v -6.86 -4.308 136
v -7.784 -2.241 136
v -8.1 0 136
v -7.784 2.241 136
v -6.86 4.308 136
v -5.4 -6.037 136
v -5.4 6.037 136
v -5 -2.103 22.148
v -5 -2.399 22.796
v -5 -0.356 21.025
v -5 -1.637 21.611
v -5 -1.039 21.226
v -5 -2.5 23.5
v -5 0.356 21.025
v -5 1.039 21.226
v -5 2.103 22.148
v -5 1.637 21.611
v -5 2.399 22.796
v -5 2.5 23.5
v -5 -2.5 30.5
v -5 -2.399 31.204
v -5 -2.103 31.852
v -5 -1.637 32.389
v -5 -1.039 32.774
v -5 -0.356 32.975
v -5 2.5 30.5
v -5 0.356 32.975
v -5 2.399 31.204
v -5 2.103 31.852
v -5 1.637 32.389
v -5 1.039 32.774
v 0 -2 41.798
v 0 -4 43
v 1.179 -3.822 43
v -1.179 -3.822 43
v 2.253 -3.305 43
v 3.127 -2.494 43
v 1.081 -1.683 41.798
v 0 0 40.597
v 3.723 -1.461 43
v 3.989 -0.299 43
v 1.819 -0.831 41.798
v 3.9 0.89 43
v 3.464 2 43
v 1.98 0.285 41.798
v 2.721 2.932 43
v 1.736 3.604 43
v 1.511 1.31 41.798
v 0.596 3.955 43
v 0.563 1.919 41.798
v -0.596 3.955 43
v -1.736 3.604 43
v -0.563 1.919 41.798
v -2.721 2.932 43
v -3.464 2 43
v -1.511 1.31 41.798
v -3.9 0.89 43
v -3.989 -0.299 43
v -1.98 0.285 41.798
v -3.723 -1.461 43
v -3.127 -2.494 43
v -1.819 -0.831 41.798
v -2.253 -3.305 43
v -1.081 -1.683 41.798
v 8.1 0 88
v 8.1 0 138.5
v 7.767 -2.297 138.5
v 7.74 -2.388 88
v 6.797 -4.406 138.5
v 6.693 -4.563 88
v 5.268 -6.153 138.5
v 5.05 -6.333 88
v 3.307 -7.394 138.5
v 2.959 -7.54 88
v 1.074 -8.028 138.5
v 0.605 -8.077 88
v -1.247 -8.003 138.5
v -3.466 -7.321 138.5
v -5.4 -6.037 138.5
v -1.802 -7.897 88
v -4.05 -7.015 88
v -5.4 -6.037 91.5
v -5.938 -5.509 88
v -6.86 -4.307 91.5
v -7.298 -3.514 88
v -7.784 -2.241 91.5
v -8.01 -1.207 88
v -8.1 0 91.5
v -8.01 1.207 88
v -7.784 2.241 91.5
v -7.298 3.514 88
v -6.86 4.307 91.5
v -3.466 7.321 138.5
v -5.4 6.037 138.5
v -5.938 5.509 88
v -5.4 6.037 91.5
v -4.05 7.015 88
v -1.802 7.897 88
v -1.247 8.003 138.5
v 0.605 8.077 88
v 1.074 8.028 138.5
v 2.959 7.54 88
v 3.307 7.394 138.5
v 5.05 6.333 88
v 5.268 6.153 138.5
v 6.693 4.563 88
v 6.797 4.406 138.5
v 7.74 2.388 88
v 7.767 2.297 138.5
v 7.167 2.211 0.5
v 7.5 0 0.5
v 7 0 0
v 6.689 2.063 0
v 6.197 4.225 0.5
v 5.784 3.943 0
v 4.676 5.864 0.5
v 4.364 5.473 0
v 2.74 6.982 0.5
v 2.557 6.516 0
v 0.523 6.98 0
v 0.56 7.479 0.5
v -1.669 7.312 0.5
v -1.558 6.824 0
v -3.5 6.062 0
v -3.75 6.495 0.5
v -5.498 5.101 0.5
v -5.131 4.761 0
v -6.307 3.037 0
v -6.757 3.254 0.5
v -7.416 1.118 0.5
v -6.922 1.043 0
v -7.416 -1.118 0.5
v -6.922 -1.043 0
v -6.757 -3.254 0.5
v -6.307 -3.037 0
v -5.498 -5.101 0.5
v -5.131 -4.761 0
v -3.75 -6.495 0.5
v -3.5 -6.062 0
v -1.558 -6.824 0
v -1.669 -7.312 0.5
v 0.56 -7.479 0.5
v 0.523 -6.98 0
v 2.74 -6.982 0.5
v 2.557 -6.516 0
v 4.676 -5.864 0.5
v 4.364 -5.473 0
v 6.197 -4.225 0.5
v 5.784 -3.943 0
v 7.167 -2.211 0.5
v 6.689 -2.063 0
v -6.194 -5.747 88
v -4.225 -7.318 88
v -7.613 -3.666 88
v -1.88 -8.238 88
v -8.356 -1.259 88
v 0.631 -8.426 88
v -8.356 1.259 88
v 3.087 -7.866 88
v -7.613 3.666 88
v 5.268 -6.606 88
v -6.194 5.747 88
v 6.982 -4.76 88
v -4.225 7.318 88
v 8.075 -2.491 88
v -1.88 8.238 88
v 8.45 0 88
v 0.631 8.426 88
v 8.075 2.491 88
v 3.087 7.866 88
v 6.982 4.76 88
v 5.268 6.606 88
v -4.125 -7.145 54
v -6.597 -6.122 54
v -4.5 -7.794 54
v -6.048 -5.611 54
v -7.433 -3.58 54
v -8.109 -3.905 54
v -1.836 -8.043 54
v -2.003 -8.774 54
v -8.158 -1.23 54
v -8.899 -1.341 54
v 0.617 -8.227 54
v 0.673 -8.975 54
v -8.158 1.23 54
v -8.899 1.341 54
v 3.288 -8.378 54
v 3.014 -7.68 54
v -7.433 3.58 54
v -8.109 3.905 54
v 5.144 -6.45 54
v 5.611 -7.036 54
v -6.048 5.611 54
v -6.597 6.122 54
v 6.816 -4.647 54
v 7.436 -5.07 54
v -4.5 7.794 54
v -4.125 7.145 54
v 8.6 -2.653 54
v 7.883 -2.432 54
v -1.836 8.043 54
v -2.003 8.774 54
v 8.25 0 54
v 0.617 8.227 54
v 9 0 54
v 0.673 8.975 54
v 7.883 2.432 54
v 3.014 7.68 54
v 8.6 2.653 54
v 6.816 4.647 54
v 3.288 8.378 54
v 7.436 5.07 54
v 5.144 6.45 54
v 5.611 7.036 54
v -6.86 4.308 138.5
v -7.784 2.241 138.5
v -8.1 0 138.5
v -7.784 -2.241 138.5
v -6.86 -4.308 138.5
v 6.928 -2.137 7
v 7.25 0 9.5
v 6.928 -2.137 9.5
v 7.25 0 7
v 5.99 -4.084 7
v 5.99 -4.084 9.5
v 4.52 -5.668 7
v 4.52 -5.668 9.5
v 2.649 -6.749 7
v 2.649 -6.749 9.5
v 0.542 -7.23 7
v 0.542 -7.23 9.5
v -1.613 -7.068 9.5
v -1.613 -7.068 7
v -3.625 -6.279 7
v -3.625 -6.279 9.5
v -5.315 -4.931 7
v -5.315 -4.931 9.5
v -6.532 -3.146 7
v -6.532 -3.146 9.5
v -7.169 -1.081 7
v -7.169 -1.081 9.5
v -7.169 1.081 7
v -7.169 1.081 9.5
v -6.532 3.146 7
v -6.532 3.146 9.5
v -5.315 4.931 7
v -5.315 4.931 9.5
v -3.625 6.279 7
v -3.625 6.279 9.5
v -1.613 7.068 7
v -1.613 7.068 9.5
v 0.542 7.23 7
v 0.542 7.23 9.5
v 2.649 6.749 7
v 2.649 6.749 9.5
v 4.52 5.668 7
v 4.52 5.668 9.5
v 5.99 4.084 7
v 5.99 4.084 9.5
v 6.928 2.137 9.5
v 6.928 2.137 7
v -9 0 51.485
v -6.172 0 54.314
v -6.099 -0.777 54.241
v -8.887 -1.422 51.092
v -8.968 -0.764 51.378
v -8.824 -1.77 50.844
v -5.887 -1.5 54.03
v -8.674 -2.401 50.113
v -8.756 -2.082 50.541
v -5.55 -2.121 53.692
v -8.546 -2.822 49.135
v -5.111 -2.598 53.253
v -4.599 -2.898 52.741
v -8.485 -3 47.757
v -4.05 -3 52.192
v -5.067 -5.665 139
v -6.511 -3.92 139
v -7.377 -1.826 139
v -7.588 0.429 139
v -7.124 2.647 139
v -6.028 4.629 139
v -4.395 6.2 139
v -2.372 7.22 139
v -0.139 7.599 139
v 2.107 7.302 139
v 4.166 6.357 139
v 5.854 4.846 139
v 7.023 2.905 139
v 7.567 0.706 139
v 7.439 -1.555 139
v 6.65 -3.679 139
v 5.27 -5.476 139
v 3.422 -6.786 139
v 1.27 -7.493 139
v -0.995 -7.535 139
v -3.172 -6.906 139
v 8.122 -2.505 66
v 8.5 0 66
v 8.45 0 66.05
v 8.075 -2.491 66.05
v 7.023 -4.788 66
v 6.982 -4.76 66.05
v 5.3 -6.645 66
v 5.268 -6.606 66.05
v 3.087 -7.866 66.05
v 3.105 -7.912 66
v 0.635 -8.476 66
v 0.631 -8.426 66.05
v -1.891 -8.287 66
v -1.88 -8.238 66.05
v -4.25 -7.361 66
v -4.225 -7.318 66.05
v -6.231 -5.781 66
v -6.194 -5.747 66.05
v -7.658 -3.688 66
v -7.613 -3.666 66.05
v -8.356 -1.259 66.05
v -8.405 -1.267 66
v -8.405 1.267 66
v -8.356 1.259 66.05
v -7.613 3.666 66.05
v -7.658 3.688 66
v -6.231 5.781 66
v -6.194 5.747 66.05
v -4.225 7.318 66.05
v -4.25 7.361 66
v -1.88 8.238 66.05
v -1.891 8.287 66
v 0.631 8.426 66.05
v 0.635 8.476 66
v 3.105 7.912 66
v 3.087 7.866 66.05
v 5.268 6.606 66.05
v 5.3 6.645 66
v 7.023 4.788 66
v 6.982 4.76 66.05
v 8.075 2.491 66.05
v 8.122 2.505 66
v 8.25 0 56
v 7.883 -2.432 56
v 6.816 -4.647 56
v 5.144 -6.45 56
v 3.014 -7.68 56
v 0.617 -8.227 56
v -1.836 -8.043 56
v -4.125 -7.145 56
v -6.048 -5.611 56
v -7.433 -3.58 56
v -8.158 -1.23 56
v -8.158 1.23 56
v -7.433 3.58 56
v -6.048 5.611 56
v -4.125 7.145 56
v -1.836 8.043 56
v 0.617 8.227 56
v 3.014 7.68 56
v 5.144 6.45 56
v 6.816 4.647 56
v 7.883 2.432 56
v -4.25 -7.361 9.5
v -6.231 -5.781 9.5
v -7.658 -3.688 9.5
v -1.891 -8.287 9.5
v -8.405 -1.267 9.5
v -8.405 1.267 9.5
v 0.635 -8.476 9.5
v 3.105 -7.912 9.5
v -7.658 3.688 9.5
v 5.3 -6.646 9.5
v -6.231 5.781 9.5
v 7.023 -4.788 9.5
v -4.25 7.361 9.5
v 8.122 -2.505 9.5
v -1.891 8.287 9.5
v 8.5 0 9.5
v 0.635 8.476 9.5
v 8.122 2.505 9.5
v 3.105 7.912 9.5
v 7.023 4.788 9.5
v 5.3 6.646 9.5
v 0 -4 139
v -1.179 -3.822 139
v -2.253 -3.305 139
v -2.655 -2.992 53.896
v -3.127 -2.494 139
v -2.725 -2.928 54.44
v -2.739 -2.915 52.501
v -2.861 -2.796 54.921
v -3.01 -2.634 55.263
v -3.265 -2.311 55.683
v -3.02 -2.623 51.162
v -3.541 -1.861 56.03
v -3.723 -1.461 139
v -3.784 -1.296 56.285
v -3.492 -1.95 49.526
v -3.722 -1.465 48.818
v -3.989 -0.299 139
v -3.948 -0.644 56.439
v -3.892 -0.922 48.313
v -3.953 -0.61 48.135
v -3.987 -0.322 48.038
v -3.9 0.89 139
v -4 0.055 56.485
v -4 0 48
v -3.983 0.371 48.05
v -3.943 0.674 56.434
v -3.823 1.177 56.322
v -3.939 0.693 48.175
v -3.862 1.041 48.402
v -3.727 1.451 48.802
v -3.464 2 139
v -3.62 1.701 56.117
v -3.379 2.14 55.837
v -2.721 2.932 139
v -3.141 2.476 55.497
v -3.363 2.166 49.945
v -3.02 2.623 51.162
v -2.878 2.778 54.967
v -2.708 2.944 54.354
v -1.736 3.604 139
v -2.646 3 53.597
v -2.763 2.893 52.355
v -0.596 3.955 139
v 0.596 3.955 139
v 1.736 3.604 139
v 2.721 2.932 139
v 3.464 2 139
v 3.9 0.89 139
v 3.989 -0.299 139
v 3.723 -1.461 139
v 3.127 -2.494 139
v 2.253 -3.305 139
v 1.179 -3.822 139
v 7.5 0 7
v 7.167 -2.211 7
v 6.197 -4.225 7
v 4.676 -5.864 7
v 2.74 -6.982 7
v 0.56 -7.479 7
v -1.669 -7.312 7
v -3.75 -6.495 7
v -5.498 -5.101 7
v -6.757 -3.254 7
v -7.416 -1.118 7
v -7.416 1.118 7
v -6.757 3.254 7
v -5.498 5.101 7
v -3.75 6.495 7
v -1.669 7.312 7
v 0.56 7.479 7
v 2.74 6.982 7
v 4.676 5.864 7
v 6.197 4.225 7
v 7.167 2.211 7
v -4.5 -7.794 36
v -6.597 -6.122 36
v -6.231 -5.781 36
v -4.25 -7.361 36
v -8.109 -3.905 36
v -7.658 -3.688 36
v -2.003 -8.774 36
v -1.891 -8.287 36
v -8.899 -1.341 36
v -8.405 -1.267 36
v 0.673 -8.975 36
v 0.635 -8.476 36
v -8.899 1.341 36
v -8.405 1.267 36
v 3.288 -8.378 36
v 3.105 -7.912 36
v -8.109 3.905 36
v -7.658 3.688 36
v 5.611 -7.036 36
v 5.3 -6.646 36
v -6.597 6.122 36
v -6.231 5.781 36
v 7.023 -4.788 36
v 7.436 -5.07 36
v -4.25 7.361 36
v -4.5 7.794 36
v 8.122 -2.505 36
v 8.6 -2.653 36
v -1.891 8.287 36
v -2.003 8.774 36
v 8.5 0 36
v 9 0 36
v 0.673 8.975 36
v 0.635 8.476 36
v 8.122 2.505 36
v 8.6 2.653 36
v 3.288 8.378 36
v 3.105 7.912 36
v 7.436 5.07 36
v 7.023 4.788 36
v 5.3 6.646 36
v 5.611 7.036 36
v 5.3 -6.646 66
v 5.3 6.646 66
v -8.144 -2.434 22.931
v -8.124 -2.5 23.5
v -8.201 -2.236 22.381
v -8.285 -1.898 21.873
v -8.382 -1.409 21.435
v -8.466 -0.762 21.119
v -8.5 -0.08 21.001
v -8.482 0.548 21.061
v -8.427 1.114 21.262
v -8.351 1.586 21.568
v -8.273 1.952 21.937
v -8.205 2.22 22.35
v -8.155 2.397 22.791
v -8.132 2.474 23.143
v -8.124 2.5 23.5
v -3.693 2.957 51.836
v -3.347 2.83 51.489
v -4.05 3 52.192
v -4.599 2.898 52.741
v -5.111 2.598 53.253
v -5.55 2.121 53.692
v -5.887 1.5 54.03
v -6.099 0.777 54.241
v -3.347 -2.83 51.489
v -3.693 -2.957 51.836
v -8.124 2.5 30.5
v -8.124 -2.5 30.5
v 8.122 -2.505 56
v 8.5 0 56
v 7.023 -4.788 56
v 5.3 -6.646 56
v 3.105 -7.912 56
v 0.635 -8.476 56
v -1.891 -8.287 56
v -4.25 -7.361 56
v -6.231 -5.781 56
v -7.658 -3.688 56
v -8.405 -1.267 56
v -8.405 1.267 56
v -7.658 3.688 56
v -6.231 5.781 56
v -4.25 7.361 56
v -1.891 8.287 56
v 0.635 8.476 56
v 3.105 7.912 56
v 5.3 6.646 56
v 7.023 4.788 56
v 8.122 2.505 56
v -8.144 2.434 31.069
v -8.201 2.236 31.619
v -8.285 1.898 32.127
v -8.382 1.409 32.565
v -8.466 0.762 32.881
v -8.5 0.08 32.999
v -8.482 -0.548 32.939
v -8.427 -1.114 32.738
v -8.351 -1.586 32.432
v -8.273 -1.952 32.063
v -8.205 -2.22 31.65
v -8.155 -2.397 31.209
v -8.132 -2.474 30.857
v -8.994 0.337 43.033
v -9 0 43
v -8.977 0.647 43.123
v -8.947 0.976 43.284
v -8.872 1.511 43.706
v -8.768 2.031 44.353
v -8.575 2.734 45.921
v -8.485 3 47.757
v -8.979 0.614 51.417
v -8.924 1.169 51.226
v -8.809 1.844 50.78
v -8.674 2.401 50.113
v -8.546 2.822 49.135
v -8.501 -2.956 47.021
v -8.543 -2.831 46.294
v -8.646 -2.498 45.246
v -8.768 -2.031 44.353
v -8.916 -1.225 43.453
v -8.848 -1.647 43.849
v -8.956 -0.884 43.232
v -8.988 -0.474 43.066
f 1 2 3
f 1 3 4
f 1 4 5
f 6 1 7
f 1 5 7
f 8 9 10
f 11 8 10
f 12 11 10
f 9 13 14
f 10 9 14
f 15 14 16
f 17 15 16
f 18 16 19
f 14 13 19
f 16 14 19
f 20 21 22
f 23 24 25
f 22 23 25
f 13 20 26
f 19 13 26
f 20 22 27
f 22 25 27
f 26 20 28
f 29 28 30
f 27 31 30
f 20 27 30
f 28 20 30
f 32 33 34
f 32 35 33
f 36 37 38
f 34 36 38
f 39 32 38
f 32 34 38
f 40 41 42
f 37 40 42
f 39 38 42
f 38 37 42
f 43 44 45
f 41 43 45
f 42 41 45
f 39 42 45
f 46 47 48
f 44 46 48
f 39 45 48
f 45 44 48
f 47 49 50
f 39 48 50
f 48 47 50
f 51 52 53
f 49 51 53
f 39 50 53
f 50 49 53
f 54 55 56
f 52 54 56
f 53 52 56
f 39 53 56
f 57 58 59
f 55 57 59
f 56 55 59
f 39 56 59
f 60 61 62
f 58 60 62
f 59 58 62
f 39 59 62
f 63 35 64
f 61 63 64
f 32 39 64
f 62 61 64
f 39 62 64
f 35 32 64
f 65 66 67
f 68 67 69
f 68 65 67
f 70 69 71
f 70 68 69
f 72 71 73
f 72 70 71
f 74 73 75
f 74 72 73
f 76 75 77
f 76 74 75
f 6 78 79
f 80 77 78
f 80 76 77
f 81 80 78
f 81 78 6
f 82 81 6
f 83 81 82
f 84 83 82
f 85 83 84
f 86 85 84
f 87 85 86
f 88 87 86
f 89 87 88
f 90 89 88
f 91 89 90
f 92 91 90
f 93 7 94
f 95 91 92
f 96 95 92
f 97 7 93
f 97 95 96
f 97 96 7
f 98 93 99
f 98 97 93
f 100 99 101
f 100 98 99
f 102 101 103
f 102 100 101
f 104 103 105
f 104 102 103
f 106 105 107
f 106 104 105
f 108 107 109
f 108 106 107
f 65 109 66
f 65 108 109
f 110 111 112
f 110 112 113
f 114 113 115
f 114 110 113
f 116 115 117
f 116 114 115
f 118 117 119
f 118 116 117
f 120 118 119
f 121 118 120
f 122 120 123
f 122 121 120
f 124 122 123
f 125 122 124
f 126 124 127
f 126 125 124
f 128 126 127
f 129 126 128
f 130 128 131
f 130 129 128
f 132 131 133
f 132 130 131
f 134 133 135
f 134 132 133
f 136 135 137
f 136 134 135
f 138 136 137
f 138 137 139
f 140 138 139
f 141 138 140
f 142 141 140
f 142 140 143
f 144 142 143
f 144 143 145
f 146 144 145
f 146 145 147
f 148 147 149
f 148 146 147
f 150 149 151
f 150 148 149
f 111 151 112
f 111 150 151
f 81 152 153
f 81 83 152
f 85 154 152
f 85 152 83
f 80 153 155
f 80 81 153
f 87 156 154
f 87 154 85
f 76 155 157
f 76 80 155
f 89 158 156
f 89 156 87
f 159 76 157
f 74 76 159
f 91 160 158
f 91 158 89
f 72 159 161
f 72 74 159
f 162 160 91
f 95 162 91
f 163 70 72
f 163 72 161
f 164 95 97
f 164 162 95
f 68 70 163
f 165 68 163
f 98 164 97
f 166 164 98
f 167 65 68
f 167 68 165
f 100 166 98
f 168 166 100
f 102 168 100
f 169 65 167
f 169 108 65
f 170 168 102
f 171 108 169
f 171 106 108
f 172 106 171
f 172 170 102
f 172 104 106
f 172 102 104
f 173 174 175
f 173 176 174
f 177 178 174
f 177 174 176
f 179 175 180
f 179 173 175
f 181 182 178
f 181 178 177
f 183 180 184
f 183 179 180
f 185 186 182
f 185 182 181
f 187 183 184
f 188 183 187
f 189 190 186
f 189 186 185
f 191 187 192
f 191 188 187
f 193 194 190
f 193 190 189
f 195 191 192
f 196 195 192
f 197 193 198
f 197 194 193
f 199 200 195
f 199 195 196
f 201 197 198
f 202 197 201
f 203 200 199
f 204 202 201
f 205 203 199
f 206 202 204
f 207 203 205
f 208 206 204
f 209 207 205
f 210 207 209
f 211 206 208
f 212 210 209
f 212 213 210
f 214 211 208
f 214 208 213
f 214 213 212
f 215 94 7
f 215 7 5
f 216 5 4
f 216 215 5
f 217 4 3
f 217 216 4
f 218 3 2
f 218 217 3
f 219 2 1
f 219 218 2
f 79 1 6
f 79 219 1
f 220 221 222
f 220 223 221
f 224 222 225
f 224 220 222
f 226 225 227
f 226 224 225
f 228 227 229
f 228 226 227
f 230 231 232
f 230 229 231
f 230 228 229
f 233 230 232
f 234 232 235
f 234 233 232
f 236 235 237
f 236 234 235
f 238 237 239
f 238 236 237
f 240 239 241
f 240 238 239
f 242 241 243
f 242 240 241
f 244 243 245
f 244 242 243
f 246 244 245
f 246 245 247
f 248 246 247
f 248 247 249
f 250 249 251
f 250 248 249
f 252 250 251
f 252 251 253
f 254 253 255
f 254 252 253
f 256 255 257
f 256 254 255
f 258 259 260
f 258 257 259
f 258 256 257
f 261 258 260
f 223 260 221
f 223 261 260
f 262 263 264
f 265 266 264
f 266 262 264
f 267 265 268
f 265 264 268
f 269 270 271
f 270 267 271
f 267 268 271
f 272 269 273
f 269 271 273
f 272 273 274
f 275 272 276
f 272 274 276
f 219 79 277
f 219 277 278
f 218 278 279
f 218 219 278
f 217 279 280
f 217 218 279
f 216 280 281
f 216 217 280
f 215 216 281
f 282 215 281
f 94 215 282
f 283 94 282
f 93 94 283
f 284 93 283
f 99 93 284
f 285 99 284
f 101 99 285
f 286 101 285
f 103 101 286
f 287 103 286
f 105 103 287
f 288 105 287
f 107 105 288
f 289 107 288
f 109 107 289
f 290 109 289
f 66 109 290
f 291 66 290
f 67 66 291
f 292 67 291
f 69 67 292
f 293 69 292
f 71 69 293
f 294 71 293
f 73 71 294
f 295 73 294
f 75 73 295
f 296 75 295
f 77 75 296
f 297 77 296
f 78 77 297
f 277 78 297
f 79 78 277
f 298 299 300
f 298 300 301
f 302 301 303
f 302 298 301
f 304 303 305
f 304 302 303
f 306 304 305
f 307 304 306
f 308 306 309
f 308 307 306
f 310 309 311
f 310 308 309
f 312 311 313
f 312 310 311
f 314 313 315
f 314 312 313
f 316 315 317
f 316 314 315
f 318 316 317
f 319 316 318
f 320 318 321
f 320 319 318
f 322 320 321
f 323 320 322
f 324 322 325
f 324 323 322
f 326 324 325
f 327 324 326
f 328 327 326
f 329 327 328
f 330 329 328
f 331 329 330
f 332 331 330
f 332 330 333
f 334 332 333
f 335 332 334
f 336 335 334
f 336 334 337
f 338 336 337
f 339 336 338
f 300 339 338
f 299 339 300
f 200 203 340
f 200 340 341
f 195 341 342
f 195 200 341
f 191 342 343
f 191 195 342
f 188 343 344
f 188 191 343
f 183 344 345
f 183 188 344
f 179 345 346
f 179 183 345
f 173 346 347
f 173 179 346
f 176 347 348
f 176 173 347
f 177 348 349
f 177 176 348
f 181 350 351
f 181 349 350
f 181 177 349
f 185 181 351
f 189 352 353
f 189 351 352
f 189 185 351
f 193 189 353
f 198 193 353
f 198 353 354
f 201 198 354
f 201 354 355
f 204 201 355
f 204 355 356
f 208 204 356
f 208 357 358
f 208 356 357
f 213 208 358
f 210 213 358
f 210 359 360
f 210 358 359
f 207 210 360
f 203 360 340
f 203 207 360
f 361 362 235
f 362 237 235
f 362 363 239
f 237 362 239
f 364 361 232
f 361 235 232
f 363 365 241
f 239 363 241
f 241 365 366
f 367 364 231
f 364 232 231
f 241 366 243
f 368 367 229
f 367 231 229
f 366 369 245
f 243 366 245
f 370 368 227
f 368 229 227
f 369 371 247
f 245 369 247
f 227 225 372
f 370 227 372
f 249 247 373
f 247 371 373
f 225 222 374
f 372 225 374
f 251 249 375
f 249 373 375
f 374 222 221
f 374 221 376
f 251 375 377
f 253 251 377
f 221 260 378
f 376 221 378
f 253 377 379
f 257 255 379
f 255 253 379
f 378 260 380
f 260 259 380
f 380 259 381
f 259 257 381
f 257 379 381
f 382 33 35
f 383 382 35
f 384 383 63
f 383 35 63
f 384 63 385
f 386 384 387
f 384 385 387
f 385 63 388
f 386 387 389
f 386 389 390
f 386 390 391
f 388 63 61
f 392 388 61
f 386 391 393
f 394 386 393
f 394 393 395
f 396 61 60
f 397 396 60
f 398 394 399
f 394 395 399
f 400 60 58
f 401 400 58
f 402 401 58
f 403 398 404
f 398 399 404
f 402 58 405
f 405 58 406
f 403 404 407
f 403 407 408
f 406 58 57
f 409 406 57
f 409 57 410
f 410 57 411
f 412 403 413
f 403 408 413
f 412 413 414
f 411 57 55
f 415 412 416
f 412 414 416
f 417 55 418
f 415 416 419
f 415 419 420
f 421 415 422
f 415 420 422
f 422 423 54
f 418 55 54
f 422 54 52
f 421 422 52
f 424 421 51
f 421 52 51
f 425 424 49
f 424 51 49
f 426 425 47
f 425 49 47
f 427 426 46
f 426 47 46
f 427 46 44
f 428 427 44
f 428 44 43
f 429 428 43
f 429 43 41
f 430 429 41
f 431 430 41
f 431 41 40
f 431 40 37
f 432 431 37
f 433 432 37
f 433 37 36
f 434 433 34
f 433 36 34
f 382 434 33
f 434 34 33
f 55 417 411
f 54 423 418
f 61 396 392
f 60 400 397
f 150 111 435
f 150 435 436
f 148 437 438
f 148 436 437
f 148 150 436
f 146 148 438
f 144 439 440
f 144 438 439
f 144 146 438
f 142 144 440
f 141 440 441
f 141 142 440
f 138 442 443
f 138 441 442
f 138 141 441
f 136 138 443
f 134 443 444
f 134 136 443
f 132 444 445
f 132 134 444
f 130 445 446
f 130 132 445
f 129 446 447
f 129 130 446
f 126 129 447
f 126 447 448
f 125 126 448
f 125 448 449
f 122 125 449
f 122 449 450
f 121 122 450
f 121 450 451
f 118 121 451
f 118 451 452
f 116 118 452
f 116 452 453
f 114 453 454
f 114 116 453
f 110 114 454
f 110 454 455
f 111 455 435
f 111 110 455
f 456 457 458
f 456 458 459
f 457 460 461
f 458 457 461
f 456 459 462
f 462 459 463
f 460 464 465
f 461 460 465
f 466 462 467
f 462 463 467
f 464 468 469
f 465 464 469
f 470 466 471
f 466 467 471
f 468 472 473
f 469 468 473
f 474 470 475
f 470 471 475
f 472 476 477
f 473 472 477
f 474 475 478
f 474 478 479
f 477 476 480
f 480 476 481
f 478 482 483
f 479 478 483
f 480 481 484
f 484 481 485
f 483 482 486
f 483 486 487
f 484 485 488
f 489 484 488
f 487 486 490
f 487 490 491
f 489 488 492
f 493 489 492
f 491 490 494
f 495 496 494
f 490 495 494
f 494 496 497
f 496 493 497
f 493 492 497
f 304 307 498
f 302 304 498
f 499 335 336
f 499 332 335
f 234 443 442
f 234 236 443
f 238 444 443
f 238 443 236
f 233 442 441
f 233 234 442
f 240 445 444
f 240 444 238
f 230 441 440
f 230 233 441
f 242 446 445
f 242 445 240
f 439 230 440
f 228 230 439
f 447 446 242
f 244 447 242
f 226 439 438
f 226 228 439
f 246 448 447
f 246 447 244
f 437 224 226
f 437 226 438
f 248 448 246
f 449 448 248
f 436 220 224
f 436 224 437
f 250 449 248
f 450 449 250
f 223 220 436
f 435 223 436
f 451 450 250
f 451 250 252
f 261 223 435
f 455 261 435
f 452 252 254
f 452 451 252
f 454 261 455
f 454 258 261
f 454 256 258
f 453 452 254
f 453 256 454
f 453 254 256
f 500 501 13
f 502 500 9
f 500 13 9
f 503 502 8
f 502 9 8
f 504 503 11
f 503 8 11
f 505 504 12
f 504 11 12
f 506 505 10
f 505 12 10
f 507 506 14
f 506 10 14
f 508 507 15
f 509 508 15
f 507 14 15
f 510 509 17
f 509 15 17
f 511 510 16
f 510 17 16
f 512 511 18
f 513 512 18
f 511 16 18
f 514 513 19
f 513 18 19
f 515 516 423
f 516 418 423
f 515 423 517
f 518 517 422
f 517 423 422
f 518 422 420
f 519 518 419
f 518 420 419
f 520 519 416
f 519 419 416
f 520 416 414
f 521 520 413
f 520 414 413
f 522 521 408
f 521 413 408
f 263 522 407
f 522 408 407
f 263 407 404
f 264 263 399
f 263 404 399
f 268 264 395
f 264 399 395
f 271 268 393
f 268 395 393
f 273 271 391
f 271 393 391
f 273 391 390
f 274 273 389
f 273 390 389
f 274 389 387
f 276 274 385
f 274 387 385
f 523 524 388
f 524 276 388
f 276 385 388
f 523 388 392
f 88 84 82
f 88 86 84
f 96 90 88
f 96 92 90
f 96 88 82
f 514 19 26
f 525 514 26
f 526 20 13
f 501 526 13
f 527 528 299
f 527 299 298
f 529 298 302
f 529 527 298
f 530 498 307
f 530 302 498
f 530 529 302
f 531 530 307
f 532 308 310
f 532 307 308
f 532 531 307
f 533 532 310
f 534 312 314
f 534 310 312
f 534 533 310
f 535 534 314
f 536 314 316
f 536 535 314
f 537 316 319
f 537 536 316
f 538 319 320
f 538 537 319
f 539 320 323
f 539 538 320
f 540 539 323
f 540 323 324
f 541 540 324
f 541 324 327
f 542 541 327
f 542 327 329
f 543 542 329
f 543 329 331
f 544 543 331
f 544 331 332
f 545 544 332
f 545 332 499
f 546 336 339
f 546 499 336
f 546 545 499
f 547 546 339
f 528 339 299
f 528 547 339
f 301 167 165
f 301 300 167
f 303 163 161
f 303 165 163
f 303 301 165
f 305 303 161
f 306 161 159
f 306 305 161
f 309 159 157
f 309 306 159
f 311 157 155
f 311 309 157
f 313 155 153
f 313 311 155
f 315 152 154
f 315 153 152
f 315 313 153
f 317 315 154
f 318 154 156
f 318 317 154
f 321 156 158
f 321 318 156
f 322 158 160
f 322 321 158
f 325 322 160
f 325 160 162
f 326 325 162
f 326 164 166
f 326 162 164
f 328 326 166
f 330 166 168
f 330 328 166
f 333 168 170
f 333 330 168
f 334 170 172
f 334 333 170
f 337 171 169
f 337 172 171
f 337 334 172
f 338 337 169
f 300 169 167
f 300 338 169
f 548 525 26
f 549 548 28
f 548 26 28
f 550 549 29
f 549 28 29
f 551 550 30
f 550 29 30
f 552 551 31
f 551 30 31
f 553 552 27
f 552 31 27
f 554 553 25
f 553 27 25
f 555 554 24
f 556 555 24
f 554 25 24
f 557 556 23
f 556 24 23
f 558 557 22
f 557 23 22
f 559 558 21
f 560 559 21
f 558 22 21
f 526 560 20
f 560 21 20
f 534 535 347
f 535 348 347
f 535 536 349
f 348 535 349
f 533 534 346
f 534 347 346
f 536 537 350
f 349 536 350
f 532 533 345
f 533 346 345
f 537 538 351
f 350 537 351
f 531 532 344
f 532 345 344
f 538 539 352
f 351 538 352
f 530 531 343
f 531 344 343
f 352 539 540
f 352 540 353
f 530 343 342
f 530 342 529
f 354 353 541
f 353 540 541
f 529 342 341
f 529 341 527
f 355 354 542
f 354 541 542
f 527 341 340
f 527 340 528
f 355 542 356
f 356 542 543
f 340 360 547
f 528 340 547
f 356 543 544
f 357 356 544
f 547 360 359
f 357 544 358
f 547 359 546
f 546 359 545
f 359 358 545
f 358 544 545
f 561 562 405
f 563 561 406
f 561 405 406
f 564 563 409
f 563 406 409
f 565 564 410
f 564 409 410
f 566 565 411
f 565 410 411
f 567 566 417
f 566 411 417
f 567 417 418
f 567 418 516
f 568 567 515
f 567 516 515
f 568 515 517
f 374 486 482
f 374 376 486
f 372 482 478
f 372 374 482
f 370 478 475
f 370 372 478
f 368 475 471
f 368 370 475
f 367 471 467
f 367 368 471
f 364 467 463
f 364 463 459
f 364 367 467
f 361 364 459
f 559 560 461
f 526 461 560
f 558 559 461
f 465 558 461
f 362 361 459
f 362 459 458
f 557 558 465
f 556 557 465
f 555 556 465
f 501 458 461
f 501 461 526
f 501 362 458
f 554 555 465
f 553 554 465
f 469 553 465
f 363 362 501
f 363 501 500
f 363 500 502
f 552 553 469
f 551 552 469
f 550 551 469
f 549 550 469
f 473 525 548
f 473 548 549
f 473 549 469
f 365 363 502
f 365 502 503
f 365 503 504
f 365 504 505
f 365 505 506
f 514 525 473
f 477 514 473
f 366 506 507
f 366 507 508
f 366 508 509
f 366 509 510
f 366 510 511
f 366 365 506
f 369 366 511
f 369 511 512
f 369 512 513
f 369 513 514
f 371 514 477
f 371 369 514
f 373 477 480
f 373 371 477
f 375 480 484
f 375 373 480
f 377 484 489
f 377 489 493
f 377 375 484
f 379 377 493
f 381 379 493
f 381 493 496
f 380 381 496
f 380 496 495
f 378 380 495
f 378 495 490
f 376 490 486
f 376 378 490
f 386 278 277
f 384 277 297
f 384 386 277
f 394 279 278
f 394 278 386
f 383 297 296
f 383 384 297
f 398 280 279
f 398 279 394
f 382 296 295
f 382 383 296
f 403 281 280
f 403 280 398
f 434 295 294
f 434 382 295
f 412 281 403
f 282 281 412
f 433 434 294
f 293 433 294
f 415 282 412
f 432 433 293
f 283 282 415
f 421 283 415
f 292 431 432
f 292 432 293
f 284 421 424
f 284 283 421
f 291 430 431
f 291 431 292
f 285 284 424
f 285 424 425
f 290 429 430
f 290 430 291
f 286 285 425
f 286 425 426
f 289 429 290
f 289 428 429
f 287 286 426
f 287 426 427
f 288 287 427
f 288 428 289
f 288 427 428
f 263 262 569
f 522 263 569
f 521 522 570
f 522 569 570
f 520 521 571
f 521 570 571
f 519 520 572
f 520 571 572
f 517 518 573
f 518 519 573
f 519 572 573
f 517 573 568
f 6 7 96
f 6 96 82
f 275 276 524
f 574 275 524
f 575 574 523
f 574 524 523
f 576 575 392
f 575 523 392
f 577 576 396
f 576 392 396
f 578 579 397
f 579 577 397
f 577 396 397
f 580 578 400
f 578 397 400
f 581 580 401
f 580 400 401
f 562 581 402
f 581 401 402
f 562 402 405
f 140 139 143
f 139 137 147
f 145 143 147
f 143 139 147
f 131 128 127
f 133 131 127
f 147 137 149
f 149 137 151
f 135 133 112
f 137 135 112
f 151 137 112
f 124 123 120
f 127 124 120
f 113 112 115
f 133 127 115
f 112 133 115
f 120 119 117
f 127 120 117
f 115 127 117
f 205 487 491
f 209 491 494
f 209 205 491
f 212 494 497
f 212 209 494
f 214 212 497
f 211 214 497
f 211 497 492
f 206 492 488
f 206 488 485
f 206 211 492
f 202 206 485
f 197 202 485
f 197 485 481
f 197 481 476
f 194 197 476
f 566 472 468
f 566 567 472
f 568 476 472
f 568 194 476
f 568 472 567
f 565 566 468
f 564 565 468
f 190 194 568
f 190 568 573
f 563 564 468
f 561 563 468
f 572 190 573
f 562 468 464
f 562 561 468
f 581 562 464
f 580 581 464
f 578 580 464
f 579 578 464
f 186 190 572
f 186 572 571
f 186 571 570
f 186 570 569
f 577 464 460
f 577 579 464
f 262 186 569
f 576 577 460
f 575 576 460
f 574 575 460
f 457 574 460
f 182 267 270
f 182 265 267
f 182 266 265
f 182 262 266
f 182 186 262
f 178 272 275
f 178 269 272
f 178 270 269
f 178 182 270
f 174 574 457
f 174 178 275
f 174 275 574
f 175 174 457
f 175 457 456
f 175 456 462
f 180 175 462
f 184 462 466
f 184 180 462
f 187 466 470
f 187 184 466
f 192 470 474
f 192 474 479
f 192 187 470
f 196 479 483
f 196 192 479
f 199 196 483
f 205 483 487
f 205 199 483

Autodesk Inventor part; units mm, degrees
ref_plane "XZ Plane" through (0, 0, 0) normal (0, 1, 0) x (-1, 0, 0)
ref_plane "XY Plane" through (0, 0, 0) normal (0, 0, 1) x (1, 0, 0)
sketch "Sketch1" plane through (0, 0, 0) normal (0, 0, 1) x (1, 0, 0)
  circle A0 centre (0, 0) radius 7.5
  dimension "d0" = 15
extrude "Extrusion1" add sketch "Sketch1" along normal blind 7
sketch "Sketch2" plane through (0, 0, 7) normal (0, 0, 1) x (1, 0, 0)
  circle A0 centre (0, 0) radius 7.25
  dimension "d3" = 14.5
extrude "Extrusion2" add sketch "Sketch2" along normal blind 2.5
sketch "Sketch3" plane through (0, 0, 9.5) normal (0, 0, 1) x (1, 0, 0)
  circle A0 centre (0, 0) radius 8.5
  dimension "d6" = 17
extrude "Extrusion3" add sketch "Sketch3" along normal blind 44.5
sketch "Sketch4" plane through (0, 0, 54) normal (0, 0, 1) x (1, 0, 0)
  circle A0 centre (0, 0) radius 8.25
  dimension "d9" = 16.5
extrude "Extrusion4" add sketch "Sketch4" along normal blind 2
sketch "Sketch5" plane through (0, 0, 56) normal (0, 0, 1) x (1, 0, 0)
  circle A0 centre (0, 0) radius 8.5
  dimension "d12" = 17
extrude "Extrusion5" add sketch "Sketch5" along normal blind 10
sketch "Sketch6" plane through (0, 0, 66) normal (0, 0, 1) x (1, 0, 0)
  circle A0 centre (0, 0) radius 8.45
  dimension "d15" = 16.9
extrude "Extrusion6" add sketch "Sketch6" along normal blind 22
sketch "Sketch7" plane through (0, 0, 88) normal (0, 0, 1) x (1, 0, 0)
  circle A0 centre (0, 0) radius 8.1
  dimension "d18" = 16.2
extrude "Extrusion7" add sketch "Sketch7" along normal blind 51
sketch "Sketch8" plane through (0, 0, 139) normal (0, 0, 1) x (1, 0, 0)
  line L0 (-5.4, 8.2708) -> (-5.4, -12.4422)
  line L1 (-5.4, -12.4422) -> (-13.0378, -12.4422)
  line L2 (-13.0378, -12.4422) -> (-13.0378, 8.2708)
  line L3 (-13.0378, 8.2708) -> (-5.4, 8.2708)
  point P0 (0, 0)
  dimension "d63" = 5.4
extrude "Extrusion8" cut sketch "Sketch8" against normal blind 47.5
sketch "Sketch9" plane through (0, 0, 139) normal (0, 0, 1) x (1, 0, 0)
  arc A0 (-5.4, -6.0374) -> (-5.4, 6.0374) centre (0, 0) ccw projected
  circle A1 centre (0, 0) radius 8.1
  point P0 (-6.0374, 5.4)
  point P1 (6.0374, 5.4)
  point P2 (6.0374, 5.4)
  point P3 (-6.0374, 5.4)
extrude "Extrusion9" add sketch "Sketch9" against normal blind 3
sketch "Sketch10" plane through (0, 0, 54) normal (0, 0, 1) x (1, 0, 0)
  circle A0 centre (0, 0) radius 9
  dimension "d26" = 18
extrude "Extrusion10" add sketch "Sketch10" against normal blind 18
chamfer "Chamfer1" distance 0.05 angle 45 1 edges at (-8.45, 0, 66)
ref_plane "Work Plane1" through (-5, 0, 0) normal (1, 0, 0) x (0, 1, 0)
sketch "Sketch11" plane through (-5, 0, 0) normal (1, 0, 0) x (0, 1, 0)
  line L0 (0, 23.5) -> (0, 30.5) construction
  line L1 (2.5, 23.5) -> (2.5, 30.5)
  line L2 (-2.5, 30.5) -> (-2.5, 23.5)
  arc A0 (-2.5, 23.5) -> (2.5, 23.5) centre (0, 23.5) ccw
  arc A1 (2.5, 30.5) -> (-2.5, 30.5) centre (0, 30.5) ccw
  line L3 (7.5, 0) -> (-7.5, 0) projected
  point P0 (0, 0)
  point P1 (0, 27)
  dimension "d33" = 7
  dimension "d34" = 5
  dimension "d35" = 0
  dimension "d36" = 23.5
extrude "Extrusion11" cut sketch "Sketch11" against normal blind 22
chamfer "Chamfer2" distance 0.5 angle 45 2 edges at (-7.5, 0, 0) (-8.1, 0, 139)
sketch "Sketch12" plane through (0, 0, 0) normal (0, 1, 0) x (-1, 0, 0)
  line L0 (9, 54) -> (9, 36) projected
  line L1 (9, 43) -> (1.9289, 50.0711)
  line L2 (1.9289, 50.0711) -> (6.1716, 54.3137)
  line L3 (6.1716, 54.3137) -> (13.2426, 47.2426)
  line L4 (13.2426, 47.2426) -> (9, 43)
  line L5 (9, 43) -> (19, 43) construction
  line L6 (-9, 36) -> (9, 36) projected
  point P0 (0, 0)
  dimension "d42" = 10
  dimension "d43" = 135
  dimension "d44" = 6
  dimension "d47" = 7
extrude "Extrusion12" cut sketch "Sketch12" along normal mid plane 6
fillet "Fillet1" radius 3 4 edges at (-7.3284, -3, 53.1569) (-5.2071, 3, 46.7929) (-5.2071, -3, 46.7929) (-7.3284, 3, 53.1569)
sketch "Sketch13" plane through (0, 0, 139) normal (0, 0, 1) x (1, 0, 0)
  circle A0 centre (0, 0) radius 8.1 projected
hole "Hole1" at (0, 0, 139) direction (0, 0, -1) diameter 8 depth 96 tip angle 118
sketch "Sketch14" plane through (-4.0503, 0, 52.1924) normal (-0.7071068, 0, -0.7071068) x (-0.7071068, 0, 0.7071068)
  arc A0 (-1.4567, -2.6226) -> (-1.4567, 2.6226) centre (0, 0) ccw projected
  point P0 (-39.7696, 0)
hole "Hole2" at (-4.0503, 0, 52.1924) direction (0.7071068, 0, 0.7071068) diameter 6 depth 4.75 tip angle 118
properties part number "shaft"
